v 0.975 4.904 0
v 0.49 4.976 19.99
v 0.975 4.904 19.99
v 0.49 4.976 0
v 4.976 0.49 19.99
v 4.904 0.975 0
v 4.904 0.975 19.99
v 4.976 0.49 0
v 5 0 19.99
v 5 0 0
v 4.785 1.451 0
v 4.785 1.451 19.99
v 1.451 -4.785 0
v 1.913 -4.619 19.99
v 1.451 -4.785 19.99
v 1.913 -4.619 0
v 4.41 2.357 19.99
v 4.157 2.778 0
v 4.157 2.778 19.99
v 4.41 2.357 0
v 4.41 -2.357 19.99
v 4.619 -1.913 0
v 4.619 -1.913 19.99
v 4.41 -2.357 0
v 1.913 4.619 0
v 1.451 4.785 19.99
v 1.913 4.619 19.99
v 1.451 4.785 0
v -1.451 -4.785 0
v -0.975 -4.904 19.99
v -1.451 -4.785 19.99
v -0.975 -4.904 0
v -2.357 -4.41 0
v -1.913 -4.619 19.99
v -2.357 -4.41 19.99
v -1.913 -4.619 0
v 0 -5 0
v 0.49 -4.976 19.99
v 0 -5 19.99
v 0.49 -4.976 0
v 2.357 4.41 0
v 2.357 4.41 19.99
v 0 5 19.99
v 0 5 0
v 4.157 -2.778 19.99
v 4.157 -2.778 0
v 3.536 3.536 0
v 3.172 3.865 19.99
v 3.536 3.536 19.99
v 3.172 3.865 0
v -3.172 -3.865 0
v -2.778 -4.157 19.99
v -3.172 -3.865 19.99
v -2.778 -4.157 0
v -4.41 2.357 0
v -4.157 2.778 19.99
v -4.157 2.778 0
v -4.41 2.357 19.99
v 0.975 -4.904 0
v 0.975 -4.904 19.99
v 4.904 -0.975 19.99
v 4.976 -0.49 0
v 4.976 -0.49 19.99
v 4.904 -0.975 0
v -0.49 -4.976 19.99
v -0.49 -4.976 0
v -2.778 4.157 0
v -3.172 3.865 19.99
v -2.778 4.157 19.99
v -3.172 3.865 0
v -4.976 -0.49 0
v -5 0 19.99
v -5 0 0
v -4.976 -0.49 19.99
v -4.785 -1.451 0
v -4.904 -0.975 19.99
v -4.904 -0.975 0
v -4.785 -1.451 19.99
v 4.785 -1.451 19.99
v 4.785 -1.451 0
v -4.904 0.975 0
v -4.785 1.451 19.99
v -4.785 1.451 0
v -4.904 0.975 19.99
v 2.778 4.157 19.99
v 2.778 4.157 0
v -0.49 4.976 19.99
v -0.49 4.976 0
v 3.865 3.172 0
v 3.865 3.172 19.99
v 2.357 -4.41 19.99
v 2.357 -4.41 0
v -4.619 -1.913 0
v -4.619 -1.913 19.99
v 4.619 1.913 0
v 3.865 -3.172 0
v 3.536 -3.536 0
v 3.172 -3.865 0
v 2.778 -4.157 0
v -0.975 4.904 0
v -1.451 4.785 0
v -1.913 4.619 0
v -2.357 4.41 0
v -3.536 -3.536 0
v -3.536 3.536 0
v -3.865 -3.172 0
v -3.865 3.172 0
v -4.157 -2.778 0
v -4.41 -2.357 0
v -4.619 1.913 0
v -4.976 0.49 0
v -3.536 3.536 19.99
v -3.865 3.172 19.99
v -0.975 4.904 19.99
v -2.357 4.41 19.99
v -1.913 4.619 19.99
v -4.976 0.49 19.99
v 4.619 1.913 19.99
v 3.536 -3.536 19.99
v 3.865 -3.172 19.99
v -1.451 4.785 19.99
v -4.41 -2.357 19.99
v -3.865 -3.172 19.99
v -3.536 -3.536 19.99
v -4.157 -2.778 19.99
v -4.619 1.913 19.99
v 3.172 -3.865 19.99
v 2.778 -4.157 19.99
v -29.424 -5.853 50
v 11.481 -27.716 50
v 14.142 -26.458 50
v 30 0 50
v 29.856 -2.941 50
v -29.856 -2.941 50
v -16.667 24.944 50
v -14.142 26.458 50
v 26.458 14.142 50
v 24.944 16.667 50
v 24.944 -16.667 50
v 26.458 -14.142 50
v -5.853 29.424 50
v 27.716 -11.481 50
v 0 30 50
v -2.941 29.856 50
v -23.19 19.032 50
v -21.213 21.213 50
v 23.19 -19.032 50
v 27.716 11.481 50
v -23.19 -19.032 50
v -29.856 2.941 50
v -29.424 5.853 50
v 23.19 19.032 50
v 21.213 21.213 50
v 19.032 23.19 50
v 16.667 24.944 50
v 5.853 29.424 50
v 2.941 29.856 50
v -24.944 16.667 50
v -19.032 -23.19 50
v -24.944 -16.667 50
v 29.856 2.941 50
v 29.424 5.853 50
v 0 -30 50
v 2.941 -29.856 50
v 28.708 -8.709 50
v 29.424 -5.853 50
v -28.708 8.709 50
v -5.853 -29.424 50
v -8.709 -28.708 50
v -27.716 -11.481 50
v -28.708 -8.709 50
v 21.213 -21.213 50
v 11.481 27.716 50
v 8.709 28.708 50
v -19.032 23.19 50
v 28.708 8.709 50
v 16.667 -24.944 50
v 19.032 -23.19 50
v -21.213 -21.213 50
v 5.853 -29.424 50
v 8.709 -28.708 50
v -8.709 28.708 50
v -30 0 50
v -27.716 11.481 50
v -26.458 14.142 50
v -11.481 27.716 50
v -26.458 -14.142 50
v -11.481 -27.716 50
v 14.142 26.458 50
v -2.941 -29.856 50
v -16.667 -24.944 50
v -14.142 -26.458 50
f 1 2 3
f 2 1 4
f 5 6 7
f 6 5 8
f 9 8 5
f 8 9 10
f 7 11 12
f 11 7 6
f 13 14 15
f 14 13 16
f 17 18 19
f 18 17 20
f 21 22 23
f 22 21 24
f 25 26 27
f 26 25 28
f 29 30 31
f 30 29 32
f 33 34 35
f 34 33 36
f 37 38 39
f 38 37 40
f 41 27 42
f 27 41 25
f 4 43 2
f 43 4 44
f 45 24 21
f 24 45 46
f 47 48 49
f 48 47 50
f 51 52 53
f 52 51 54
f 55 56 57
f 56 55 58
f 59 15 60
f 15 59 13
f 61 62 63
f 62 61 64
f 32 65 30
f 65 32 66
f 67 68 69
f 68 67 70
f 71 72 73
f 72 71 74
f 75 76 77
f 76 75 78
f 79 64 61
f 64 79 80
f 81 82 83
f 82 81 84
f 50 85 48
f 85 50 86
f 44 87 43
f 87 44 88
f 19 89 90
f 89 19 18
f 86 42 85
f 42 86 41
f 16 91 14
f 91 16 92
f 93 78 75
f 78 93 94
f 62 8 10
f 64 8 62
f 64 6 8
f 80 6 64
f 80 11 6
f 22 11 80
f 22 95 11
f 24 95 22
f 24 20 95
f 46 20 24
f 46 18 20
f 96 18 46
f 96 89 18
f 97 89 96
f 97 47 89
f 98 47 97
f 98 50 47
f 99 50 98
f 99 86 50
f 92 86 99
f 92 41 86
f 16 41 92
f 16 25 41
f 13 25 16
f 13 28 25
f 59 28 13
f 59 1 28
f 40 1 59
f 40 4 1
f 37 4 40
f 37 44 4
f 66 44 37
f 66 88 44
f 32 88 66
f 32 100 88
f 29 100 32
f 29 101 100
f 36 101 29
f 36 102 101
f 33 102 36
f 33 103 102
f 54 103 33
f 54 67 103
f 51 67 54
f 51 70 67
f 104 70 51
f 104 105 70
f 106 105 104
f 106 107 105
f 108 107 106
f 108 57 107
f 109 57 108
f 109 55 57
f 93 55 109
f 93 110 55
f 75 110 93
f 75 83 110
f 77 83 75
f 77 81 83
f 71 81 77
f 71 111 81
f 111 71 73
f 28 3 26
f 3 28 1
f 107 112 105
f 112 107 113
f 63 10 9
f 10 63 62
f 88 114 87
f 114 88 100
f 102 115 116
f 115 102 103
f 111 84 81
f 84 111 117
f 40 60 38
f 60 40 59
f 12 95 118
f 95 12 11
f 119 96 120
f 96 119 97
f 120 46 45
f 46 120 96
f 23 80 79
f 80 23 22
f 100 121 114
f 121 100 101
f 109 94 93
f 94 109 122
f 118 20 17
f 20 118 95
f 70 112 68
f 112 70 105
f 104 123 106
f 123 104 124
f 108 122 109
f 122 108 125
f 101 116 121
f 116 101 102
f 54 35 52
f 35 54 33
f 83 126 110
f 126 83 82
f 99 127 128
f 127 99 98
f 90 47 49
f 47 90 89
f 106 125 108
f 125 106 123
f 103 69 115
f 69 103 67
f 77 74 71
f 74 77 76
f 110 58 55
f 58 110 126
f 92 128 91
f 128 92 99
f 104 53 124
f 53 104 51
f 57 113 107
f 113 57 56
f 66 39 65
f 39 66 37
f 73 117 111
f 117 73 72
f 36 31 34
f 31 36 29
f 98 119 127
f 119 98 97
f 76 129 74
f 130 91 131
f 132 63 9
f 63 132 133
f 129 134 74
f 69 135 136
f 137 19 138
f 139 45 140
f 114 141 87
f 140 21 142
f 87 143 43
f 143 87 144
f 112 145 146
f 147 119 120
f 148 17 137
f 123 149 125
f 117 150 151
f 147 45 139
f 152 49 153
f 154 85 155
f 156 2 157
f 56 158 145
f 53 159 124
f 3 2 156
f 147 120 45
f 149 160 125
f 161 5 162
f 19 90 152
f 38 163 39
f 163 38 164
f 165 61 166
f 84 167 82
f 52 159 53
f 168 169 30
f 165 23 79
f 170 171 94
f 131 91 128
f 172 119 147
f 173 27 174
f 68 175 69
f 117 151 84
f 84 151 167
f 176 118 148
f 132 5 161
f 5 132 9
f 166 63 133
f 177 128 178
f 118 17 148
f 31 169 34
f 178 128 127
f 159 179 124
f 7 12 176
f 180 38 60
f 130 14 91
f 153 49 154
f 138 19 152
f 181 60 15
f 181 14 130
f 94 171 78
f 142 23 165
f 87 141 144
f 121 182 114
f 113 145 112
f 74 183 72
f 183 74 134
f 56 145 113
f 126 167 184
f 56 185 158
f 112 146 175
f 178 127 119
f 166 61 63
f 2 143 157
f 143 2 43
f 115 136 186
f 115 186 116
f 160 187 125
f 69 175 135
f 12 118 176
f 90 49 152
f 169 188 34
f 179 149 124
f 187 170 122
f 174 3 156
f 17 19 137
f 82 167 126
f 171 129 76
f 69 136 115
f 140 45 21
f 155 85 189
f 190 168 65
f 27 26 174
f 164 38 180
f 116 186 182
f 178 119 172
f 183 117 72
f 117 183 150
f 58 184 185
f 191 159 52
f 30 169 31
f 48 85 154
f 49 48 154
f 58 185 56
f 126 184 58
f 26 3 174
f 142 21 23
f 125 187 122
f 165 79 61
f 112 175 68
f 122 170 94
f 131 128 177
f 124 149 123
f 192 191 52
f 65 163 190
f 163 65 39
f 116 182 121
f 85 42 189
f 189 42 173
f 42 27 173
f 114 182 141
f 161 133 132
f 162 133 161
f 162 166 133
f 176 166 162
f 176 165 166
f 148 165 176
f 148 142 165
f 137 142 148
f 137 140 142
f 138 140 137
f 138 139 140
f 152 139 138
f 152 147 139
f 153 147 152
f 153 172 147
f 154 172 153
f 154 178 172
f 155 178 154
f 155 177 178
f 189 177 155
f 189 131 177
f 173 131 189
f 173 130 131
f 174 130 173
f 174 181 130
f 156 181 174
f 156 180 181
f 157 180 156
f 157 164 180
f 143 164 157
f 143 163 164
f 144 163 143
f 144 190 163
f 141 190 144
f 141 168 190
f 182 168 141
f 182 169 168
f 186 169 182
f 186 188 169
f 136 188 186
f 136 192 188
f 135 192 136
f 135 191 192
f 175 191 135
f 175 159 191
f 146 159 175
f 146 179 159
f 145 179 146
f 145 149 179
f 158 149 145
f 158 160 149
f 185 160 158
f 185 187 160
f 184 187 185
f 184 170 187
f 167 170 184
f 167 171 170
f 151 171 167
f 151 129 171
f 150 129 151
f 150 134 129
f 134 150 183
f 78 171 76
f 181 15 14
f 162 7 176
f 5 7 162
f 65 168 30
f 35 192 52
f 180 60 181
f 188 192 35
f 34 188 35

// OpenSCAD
// Small lab funnel - printed upright, open at top and bottom
// Units: mm. Wall thickness: 1.6. No supports needed.

$fn = 64;

// --- Dimensions ---
spout_od      = 10;   // spout outer diameter
spout_id      = spout_od - 2 * 1.6;  // spout bore (6.8)
spout_length  = 20;   // spout runs from z = 0 to z = 20
cone_bottom_d = 10;   // cone starts at spout diameter (z = 20)
cone_top_d    = 60;   // cone rim diameter (z = 50)
cone_top_z    = 50;   // rim height
overlap       = 0.01; // small overlap so the two solids fuse cleanly

// --- Model ---
union() {
    // Straight spout
    cylinder(d = spout_od, h = spout_length);

    // Cone: bottom diameter at z = spout_length, top diameter at z = cone_top_z
    translate([0, 0, spout_length - overlap])
        cylinder(d1 = cone_bottom_d, d2 = cone_top_d, h = cone_top_z - spout_length + overlap);
}
